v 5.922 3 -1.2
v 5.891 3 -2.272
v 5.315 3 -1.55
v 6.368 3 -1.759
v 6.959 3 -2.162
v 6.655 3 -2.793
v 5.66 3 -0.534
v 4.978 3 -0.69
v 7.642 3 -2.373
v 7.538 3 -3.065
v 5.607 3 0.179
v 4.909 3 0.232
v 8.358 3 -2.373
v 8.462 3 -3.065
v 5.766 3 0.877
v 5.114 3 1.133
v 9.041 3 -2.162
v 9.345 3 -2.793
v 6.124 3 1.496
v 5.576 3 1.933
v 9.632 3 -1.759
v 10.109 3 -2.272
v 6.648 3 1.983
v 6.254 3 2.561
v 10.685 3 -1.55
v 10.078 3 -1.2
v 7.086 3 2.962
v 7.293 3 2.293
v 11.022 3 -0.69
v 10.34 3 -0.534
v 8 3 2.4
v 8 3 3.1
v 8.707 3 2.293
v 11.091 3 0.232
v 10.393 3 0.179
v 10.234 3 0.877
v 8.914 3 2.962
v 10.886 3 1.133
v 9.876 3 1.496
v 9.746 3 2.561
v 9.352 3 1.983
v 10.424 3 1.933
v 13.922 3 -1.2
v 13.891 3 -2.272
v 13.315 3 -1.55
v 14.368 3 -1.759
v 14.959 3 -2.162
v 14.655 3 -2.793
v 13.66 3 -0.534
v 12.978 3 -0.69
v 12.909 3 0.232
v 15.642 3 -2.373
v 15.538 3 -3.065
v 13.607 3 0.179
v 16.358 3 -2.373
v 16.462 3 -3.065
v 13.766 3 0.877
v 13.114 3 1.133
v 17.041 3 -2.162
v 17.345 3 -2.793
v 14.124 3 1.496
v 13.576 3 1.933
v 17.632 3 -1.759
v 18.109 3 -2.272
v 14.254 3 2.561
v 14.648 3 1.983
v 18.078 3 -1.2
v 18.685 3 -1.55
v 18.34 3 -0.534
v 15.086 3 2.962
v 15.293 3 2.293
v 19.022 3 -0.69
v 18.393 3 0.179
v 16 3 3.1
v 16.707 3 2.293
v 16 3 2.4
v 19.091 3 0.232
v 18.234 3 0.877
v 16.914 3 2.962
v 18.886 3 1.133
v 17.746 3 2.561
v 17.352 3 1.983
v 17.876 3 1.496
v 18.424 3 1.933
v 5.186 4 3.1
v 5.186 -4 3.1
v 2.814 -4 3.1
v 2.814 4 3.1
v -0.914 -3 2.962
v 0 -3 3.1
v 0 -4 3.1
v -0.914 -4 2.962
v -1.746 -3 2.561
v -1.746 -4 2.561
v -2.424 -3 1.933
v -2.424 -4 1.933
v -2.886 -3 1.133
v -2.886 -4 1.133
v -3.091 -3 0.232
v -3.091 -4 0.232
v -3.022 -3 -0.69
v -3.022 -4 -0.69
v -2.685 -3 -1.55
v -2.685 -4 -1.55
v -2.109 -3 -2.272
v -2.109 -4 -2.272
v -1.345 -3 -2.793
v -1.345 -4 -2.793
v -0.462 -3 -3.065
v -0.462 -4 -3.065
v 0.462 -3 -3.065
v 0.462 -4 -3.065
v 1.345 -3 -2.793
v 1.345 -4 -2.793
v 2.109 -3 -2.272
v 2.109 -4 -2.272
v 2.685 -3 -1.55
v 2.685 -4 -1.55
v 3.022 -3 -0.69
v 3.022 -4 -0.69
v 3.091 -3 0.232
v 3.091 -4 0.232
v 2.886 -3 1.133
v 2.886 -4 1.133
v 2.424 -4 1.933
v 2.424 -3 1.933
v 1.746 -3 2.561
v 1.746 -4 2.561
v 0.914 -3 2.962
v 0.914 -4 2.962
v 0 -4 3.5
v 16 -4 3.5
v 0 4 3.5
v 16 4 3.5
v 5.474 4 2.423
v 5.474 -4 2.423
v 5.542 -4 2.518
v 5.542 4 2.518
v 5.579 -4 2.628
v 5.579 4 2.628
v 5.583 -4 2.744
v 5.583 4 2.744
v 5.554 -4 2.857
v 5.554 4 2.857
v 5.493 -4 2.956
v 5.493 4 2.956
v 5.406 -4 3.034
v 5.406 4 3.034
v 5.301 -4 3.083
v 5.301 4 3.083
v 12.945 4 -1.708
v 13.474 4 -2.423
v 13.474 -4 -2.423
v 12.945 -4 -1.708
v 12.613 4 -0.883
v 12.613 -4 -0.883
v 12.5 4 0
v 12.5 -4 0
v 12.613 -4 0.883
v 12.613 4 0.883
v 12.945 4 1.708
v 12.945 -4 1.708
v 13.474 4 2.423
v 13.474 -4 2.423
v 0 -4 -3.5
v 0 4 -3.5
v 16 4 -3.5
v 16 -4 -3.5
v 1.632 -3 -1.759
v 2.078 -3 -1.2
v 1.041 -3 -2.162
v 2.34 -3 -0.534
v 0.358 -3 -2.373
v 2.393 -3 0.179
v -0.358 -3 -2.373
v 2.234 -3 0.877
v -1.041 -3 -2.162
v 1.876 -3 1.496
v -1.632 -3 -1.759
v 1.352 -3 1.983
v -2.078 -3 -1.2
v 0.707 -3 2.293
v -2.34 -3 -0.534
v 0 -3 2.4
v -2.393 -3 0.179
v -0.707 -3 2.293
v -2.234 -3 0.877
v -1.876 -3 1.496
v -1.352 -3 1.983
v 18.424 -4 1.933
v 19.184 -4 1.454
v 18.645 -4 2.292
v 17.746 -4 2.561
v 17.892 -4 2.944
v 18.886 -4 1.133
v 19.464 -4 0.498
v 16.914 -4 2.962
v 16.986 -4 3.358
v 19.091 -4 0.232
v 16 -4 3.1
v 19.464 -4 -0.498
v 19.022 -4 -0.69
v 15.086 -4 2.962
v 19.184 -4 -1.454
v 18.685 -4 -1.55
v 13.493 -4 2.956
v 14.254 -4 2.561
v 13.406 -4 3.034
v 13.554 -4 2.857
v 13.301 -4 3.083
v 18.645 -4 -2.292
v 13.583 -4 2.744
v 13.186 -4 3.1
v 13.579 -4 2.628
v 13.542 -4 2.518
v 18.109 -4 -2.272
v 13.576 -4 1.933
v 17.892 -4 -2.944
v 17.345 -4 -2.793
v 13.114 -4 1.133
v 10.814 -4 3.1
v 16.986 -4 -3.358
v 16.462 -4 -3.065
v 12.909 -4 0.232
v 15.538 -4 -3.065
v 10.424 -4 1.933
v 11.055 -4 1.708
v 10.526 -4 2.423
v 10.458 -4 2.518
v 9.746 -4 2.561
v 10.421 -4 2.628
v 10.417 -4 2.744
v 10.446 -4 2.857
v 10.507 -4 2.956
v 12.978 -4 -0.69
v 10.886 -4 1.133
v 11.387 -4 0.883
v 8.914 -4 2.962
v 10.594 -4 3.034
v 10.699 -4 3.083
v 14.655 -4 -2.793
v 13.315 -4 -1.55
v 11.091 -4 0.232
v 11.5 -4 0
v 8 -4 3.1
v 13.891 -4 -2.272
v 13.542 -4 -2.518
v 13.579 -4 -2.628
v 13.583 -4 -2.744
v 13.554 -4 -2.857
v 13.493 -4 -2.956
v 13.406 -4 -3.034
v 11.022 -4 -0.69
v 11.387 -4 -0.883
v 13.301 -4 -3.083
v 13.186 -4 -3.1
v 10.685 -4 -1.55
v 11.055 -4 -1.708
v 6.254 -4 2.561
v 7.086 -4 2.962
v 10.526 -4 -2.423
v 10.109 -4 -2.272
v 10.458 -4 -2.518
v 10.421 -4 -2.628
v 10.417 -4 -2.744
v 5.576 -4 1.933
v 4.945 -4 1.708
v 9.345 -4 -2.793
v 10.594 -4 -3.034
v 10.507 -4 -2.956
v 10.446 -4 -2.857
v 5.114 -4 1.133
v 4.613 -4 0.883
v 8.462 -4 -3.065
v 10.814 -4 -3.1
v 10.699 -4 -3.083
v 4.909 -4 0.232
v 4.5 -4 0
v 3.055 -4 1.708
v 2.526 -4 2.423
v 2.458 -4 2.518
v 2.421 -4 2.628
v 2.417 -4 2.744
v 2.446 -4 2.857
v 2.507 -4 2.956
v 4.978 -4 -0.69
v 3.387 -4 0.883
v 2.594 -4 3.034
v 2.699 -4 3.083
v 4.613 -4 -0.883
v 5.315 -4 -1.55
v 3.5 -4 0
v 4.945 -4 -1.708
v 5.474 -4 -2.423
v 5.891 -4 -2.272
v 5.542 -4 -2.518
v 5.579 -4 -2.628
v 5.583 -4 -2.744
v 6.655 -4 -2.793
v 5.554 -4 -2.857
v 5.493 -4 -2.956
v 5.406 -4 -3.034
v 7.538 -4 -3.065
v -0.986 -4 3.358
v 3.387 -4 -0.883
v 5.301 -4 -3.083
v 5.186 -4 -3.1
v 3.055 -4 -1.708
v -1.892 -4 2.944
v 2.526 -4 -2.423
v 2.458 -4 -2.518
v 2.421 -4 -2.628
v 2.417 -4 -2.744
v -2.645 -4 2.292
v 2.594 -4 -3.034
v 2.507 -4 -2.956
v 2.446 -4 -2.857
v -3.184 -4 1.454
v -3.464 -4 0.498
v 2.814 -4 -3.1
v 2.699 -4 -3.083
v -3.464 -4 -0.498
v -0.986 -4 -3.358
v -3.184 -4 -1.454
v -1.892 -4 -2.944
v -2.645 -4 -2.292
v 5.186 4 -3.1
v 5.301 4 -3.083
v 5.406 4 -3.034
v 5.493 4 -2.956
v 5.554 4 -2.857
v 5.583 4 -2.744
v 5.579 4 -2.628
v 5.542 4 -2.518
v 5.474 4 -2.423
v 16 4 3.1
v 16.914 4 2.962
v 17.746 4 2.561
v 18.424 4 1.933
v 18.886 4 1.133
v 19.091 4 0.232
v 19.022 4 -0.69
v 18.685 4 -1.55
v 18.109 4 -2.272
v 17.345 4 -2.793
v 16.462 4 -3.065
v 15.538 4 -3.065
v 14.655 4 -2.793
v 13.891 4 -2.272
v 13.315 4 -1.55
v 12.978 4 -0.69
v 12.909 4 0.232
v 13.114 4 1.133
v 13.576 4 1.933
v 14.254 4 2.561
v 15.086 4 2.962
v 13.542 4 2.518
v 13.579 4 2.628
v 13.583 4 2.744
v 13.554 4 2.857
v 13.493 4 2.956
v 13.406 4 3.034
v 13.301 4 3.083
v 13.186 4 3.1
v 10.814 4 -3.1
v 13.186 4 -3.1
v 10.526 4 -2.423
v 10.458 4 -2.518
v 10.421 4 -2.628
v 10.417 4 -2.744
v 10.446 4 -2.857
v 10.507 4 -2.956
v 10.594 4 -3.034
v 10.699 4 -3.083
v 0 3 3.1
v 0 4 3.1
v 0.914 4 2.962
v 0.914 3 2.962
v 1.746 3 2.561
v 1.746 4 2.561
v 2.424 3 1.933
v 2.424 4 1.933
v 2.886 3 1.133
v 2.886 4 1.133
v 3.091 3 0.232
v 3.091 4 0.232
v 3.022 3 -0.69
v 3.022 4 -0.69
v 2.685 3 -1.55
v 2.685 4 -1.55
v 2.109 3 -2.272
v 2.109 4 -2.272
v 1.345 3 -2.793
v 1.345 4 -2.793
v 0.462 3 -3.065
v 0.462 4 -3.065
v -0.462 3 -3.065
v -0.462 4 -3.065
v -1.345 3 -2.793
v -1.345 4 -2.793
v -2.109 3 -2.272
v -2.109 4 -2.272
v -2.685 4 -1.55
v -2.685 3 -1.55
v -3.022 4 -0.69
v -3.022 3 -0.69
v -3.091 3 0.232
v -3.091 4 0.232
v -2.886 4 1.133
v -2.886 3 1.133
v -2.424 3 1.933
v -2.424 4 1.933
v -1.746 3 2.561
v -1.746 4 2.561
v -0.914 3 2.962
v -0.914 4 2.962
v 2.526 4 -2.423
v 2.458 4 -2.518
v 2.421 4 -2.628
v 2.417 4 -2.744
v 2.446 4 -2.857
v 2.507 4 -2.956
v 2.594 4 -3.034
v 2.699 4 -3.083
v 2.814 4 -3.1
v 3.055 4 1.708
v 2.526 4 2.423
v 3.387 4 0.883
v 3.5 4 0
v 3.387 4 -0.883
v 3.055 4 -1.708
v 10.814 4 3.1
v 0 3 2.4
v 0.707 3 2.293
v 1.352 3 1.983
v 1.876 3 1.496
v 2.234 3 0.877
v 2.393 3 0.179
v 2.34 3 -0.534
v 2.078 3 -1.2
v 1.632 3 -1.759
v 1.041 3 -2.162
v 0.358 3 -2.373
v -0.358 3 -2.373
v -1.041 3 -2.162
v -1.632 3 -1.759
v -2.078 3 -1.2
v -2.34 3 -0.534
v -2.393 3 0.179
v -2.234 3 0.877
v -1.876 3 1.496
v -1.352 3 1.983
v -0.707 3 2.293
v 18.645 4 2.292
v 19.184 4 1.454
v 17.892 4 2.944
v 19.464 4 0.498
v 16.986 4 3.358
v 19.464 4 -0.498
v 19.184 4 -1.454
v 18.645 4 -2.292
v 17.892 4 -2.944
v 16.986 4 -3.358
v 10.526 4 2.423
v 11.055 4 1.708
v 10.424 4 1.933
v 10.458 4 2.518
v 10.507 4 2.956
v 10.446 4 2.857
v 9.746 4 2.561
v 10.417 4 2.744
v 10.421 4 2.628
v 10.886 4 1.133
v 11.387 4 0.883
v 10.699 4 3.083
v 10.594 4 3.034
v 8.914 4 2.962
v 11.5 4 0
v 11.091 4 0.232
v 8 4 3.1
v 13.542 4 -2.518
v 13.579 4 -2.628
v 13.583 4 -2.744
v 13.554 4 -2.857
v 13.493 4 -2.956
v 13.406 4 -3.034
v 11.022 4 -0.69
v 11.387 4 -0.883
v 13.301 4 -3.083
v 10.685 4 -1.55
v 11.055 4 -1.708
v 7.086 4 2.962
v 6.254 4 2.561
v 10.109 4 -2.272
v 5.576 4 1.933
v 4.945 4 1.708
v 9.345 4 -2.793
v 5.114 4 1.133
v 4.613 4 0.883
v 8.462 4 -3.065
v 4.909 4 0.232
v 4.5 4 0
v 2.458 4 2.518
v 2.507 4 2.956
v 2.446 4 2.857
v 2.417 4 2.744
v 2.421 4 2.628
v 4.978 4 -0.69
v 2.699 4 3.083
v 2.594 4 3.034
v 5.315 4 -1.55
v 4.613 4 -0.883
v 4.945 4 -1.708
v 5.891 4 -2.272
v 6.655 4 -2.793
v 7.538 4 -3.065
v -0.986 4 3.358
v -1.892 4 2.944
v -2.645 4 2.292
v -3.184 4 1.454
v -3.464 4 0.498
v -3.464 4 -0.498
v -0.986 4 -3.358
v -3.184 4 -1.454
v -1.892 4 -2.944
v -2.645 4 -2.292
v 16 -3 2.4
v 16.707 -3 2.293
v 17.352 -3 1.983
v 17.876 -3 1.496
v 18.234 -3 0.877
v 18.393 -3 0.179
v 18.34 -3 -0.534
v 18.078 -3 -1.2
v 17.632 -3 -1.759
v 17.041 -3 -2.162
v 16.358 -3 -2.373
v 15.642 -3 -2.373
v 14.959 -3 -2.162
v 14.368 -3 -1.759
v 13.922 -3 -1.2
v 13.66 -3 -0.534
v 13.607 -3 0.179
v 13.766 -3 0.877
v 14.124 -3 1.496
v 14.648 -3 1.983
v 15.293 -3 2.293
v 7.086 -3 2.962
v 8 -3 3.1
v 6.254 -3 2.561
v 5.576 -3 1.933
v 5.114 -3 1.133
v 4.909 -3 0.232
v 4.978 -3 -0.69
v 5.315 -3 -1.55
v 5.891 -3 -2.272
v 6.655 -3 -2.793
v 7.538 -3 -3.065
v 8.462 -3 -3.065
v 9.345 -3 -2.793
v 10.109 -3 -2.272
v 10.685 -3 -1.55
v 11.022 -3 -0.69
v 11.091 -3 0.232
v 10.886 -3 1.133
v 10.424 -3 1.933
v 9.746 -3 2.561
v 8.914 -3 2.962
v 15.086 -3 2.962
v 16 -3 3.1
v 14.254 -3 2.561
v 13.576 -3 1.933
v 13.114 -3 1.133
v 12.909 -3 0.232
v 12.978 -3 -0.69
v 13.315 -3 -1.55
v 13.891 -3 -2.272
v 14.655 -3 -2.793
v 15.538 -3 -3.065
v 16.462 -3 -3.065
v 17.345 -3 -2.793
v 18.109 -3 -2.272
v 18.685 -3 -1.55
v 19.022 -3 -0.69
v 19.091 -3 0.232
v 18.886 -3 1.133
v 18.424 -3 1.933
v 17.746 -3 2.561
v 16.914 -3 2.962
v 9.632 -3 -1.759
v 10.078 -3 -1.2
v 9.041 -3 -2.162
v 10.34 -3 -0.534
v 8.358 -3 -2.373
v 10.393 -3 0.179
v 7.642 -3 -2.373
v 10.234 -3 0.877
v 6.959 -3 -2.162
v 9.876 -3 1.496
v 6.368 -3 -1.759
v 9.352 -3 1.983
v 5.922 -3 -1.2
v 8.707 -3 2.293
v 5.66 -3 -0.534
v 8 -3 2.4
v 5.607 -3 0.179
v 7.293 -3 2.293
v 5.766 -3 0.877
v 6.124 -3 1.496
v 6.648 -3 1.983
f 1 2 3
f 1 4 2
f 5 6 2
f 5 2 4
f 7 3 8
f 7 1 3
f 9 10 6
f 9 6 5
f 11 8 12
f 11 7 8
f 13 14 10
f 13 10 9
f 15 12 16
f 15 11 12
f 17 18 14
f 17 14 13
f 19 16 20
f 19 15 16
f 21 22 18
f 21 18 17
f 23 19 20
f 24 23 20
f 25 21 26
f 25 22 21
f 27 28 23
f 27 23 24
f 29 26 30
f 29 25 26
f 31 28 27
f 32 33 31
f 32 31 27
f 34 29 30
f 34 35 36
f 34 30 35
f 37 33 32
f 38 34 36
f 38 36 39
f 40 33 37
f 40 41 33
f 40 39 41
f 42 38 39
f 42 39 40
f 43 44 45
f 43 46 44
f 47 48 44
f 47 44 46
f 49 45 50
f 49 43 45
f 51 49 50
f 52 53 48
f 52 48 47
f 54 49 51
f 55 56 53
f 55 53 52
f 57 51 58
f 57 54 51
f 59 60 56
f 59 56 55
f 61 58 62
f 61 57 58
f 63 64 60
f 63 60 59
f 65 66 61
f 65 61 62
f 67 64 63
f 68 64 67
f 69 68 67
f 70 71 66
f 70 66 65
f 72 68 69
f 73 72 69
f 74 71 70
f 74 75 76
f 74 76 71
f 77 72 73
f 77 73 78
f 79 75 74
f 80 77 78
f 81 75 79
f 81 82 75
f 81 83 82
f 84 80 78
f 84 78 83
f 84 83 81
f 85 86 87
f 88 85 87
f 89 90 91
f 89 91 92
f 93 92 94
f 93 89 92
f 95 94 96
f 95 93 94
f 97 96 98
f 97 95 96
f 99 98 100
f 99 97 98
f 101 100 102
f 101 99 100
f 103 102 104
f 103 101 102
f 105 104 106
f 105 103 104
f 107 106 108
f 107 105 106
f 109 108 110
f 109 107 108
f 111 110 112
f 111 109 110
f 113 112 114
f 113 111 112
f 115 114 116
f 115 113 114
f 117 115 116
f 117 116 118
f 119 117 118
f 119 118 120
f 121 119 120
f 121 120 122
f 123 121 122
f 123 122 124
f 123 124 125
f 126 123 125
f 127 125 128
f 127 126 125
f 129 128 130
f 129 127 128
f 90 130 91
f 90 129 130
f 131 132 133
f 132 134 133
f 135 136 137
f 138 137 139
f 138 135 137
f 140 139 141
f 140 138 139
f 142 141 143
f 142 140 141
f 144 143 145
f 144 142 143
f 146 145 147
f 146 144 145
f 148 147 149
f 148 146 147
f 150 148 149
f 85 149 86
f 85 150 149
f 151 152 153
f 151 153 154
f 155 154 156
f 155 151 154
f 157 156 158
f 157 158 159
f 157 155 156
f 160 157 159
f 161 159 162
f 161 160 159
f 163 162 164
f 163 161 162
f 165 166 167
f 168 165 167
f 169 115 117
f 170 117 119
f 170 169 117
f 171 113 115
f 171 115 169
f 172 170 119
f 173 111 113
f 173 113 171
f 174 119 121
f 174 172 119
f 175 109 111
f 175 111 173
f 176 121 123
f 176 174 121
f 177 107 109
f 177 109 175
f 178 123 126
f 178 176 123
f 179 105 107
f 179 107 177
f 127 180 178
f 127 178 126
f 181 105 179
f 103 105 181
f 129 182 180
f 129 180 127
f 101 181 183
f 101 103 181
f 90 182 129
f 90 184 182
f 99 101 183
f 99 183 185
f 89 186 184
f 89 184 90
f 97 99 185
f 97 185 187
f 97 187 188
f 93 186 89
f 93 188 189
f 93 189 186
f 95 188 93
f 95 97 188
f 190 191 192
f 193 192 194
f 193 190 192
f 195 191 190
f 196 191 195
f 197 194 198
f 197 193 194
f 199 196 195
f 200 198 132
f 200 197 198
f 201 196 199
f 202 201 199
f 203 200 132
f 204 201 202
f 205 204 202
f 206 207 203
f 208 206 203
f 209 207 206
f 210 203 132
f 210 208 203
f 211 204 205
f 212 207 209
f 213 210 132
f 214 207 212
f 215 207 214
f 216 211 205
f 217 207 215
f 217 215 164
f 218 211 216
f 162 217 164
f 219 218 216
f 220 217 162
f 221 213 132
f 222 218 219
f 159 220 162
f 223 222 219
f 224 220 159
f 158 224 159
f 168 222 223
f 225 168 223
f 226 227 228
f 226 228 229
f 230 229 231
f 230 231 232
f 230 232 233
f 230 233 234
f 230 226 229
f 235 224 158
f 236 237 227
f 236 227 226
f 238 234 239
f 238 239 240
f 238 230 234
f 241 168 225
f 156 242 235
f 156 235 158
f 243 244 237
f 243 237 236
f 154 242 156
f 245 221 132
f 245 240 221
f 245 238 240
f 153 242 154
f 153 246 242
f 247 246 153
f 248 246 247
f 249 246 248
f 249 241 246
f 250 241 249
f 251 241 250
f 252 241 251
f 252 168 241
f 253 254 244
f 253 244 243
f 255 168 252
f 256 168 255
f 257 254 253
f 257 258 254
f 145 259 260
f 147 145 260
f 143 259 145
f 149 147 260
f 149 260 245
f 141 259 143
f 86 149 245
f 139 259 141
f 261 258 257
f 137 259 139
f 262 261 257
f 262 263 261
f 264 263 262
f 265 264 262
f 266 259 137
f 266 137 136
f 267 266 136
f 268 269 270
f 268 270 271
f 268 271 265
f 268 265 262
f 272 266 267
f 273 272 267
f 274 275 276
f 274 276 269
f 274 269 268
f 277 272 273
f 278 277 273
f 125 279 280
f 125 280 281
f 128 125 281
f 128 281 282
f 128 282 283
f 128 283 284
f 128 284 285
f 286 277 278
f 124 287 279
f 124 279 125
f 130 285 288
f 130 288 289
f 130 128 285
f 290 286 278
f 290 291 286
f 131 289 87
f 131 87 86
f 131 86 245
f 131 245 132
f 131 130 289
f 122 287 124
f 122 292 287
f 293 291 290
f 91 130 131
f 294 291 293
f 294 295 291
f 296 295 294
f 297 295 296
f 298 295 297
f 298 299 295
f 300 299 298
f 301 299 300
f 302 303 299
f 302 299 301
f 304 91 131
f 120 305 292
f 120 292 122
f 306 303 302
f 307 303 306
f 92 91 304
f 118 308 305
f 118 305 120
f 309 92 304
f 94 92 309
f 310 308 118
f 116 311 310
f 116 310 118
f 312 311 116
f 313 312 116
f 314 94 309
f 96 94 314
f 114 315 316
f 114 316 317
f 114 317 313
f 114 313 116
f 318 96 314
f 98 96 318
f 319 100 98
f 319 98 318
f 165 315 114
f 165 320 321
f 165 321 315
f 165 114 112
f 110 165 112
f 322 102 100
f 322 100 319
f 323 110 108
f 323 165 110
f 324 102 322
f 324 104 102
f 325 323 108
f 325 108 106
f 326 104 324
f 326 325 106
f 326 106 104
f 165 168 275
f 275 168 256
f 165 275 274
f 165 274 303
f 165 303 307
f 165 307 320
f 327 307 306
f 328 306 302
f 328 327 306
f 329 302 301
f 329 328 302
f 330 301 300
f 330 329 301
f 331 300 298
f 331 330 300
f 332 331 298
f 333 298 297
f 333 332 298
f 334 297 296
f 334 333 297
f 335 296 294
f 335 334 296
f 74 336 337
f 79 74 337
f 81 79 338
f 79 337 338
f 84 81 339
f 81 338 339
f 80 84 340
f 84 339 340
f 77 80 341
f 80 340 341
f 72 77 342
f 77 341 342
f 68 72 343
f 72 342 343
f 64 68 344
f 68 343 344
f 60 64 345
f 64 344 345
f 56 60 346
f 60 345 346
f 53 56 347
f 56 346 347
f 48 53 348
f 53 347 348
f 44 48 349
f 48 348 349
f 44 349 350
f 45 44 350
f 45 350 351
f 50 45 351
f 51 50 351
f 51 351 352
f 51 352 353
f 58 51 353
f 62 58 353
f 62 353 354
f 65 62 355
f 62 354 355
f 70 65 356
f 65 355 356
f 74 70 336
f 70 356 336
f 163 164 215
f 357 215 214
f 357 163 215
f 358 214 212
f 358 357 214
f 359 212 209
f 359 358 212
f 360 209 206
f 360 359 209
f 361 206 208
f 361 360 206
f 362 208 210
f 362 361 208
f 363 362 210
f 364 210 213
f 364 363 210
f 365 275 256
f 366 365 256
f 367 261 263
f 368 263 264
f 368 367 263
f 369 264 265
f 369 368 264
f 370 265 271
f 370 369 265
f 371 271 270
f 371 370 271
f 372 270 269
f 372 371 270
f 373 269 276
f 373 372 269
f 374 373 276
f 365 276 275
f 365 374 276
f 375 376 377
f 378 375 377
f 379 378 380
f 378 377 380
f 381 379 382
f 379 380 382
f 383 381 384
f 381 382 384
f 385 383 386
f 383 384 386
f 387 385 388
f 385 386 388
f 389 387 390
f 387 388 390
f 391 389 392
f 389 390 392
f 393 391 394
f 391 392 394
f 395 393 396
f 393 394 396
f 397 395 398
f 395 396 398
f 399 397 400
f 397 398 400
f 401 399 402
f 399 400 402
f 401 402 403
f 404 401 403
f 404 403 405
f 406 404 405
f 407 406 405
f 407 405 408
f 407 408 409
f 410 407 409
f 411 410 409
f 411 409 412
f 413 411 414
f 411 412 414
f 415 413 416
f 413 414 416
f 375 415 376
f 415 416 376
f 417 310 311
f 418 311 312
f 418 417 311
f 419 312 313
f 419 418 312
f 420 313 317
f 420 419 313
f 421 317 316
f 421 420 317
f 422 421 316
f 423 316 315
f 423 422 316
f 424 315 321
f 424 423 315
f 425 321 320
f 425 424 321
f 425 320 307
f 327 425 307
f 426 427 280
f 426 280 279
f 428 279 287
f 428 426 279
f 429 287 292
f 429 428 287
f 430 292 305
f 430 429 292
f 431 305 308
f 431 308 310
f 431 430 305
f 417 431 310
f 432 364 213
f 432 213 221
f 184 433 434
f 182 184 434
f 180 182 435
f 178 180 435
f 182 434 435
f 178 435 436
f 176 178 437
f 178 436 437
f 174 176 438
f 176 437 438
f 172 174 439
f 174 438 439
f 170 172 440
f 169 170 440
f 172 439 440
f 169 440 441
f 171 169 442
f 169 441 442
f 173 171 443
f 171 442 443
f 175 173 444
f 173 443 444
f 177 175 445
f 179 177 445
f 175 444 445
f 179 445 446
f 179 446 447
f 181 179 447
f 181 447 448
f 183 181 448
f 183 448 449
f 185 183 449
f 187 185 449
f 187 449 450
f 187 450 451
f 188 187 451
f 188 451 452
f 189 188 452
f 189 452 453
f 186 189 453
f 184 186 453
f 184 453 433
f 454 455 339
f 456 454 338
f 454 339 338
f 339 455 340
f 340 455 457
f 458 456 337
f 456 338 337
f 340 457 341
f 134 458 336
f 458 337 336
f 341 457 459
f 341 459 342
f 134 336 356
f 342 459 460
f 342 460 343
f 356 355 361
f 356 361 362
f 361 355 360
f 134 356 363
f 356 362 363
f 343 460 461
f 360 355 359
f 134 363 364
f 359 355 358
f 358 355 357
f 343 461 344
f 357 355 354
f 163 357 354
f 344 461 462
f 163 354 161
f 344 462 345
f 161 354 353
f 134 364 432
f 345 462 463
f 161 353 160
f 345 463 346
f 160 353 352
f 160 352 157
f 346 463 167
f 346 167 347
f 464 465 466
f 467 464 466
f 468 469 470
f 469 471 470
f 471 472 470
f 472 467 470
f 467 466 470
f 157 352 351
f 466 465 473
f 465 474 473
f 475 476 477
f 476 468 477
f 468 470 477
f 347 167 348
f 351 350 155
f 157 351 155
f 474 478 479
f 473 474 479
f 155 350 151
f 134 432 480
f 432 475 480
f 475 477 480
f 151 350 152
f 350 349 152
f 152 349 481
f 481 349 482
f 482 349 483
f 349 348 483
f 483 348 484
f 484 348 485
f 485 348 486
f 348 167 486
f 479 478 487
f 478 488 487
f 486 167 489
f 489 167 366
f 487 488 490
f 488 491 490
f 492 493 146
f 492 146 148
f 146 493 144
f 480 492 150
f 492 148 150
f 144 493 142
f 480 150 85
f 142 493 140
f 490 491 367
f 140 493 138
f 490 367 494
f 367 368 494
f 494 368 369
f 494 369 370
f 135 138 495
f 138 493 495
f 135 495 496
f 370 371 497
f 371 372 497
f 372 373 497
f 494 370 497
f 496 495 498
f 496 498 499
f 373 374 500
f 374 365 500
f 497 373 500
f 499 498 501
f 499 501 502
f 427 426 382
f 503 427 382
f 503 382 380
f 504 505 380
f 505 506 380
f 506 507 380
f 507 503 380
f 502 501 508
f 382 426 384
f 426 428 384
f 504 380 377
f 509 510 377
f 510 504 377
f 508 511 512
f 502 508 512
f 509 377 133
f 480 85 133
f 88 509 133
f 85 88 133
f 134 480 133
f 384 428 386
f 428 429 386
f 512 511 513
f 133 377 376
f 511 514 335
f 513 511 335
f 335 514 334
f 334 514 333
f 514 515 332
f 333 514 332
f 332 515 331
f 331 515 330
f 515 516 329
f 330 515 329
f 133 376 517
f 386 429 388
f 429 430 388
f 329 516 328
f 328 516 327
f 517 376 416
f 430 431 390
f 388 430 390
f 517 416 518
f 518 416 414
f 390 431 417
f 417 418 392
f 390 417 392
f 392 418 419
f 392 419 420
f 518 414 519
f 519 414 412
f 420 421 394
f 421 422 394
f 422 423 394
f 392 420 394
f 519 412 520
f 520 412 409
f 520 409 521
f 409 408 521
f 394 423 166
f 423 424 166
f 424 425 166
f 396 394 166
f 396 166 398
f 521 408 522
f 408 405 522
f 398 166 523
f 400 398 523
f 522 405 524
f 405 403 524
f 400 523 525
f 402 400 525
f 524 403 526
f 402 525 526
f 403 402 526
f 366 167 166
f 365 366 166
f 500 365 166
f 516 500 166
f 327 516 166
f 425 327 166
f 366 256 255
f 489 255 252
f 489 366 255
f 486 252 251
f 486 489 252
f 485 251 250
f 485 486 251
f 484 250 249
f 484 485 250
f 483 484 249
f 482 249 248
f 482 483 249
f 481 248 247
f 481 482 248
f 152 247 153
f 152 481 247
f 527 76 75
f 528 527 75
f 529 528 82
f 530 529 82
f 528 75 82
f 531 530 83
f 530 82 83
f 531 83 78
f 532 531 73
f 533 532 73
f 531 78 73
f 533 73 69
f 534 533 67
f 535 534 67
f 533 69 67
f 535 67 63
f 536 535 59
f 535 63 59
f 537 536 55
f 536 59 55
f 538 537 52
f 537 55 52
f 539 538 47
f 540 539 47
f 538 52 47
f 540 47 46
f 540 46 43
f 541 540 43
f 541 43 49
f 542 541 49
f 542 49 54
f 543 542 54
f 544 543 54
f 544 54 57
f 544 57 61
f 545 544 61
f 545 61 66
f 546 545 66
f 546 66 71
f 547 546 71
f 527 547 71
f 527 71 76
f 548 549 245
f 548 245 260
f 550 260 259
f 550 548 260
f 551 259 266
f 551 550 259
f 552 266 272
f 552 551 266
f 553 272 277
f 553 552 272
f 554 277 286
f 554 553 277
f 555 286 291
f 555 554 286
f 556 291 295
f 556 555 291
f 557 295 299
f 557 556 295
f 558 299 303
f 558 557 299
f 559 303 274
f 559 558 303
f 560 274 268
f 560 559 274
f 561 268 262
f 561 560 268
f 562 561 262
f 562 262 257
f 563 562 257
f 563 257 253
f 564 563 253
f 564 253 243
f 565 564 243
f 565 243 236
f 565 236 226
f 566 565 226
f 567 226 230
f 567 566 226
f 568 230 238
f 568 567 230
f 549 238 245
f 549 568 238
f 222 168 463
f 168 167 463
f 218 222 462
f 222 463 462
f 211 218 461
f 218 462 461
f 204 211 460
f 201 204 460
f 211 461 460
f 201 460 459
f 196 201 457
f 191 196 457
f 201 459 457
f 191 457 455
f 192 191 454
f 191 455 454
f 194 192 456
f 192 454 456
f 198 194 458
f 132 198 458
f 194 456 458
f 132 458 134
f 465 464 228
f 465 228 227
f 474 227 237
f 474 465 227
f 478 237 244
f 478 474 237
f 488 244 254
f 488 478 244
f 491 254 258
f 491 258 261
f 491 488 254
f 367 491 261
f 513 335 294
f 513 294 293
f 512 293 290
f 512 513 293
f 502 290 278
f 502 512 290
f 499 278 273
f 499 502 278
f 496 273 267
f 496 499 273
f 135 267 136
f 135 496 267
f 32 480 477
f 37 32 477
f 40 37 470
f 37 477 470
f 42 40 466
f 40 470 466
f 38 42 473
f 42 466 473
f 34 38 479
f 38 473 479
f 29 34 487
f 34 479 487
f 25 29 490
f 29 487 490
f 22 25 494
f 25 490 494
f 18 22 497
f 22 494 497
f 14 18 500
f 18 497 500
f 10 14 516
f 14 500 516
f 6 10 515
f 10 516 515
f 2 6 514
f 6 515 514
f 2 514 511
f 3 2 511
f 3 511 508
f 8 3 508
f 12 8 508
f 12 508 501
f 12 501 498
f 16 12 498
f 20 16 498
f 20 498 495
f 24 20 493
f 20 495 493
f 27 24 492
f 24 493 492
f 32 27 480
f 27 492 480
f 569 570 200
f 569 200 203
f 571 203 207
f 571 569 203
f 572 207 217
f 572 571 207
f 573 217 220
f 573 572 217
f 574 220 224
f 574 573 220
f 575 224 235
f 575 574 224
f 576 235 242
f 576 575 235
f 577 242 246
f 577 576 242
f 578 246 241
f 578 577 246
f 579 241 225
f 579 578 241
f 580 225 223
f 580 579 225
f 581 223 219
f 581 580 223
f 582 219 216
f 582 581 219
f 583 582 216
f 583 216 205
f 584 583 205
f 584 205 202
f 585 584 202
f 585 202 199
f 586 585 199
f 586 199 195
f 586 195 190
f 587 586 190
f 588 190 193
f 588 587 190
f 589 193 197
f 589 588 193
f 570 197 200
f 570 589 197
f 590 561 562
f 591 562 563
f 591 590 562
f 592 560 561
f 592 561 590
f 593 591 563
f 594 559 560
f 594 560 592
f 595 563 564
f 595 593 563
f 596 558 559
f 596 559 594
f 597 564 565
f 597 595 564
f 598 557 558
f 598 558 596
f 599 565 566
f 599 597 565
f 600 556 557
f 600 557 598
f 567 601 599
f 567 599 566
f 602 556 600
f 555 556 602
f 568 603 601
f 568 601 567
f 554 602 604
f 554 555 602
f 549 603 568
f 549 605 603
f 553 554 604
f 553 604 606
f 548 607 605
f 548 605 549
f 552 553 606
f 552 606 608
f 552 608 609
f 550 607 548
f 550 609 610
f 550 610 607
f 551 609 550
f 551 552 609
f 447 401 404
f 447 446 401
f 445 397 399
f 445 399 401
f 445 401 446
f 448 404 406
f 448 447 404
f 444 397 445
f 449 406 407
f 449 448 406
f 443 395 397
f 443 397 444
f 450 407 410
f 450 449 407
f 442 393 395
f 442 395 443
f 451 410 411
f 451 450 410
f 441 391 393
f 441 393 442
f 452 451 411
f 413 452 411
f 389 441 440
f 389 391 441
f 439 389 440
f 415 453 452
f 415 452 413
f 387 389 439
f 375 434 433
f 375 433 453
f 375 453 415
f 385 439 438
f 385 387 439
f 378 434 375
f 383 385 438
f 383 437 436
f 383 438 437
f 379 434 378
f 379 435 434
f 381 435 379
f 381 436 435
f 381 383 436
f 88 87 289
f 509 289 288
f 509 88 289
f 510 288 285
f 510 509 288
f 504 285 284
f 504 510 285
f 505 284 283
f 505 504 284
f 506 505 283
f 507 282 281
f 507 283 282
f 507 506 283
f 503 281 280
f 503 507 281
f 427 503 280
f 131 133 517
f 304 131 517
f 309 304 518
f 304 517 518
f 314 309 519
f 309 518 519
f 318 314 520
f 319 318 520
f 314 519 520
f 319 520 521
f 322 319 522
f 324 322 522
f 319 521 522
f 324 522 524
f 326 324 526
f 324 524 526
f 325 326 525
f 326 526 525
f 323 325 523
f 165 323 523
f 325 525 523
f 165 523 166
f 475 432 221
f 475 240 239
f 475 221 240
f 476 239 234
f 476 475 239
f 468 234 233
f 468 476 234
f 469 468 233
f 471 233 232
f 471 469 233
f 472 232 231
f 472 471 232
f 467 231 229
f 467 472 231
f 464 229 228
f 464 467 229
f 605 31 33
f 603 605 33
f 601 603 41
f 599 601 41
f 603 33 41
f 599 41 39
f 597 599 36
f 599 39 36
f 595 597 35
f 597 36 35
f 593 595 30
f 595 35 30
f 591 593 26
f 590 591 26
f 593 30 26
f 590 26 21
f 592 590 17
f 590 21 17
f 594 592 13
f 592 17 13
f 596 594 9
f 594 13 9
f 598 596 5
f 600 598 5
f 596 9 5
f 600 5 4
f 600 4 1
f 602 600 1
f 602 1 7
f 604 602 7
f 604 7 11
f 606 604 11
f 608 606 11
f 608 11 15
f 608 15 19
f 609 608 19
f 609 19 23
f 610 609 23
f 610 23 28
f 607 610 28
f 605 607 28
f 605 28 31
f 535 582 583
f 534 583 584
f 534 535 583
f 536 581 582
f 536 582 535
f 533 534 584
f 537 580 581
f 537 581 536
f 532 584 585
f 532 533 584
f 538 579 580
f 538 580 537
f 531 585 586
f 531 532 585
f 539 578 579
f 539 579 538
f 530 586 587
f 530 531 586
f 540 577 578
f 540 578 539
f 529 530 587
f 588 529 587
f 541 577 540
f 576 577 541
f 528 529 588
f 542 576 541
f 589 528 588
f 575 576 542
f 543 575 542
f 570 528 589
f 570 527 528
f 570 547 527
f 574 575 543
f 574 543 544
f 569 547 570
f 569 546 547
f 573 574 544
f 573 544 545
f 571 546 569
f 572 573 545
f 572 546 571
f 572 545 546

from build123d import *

# Parameters (mm, degrees)
BOSS_EXTRUDE1_DEPTH = 4
SKETCH3_R           = 3.1
CUT_EXTRUDE1_DEPTH  = 1
SKETCH4_R           = 2.4
CUT_EXTRUDE2_DEPTH  = 22.365860619
CUT_EXTRUDE4_START  = -1
SKETCH7_R           = 3.1
CUT_EXTRUDE4_DEPTH  = 1
LPATTERN3_COUNT     = 3
LPATTERN3_PITCH     = 8
CUT_EXTRUDE5_DEPTH  = 22.365860619
LPATTERN4_COUNT     = 2
LPATTERN4_PITCH     = 8


with BuildPart() as part:
    # Sketch2 → Boss-Extrude1 (new, symmetric)
    with BuildSketch(Plane(origin=(0, 0, 0), x_dir=(1, 0, 0), z_dir=(0, 1, 0))):
        with BuildLine():
            Line((0, 3.5), (16, 3.5))
            ThreePointArc((16, 3.5), (19.5, 0), (16, -3.5))
            Line((16, -3.5), (0, -3.5))
            ThreePointArc((0, -3.5), (-3.5, 0), (0, 3.5))
        make_face()
    extrude(amount=BOSS_EXTRUDE1_DEPTH, both=True)

    # Sketch3 → Cut-Extrude1 (cut)
    with BuildSketch(Plane(origin=(0, 4, 0), x_dir=(1, 0, 0), z_dir=(0, 1, 0))):
        with Locations(Location((0, 0, 0), (0, 0, 270))):
            Circle(SKETCH3_R)
    cut_extrude1 = extrude(amount=-CUT_EXTRUDE1_DEPTH, mode=Mode.SUBTRACT)

    # Sketch4 → Cut-Extrude2 (cut, through all)
    with BuildSketch(Plane(origin=(0, 4, 0), x_dir=(1, 0, 0), z_dir=(0, 1, 0))):
        with Locations(Location((0, 0, 0), (0, 0, 270))):
            Circle(SKETCH4_R)
    cut_extrude2 = extrude(amount=-CUT_EXTRUDE2_DEPTH, mode=Mode.SUBTRACT)

    # Sketch7 → Cut-Extrude4 (cut)
    with BuildSketch(Plane(origin=(0, -4, 0), x_dir=(-1, 0, 0), z_dir=(0, -1, 0)).offset(CUT_EXTRUDE4_START)):
        with Locations(Location((0, 0, 0), (0, 0, 270))):
            Circle(SKETCH7_R)
    cut_extrude4 = extrude(amount=CUT_EXTRUDE4_DEPTH, mode=Mode.SUBTRACT)

    # LPattern3: Cut-Extrude1, Cut-Extrude2, Cut-Extrude4 ×3
    with Locations(*[(i * LPATTERN3_PITCH, 0, 0) for i in range(1, LPATTERN3_COUNT)]):
        add(cut_extrude1, mode=Mode.SUBTRACT)
        add(cut_extrude2, mode=Mode.SUBTRACT)
        add(cut_extrude4, mode=Mode.SUBTRACT)

    # Sketch8 → Cut-Extrude5 (cut, through all)
    with BuildSketch(Plane(origin=(0, 4, 0), x_dir=(1, 0, 0), z_dir=(0, 1, 0))):
        with BuildLine():
            Line((2.814249456, 3.1), (5.185750544, 3.1))
            ThreePointArc((5.185750544, 3.1), (5.553697029, 2.856892908), (5.474391514, 2.423076923))
            ThreePointArc((5.474391514, 2.423076923), (4.5, 0), (5.474391514, -2.423076923))
            ThreePointArc((5.474391514, -2.423076923), (5.553697029, -2.856892908), (5.185750544, -3.1))
            Line((5.185750544, -3.1), (2.814249456, -3.1))
            ThreePointArc((2.814249456, -3.1), (2.446302971, -2.856892908), (2.525608486, -2.423076923))
            ThreePointArc((2.525608486, -2.423076923), (3.5, 0), (2.525608486, 2.423076923))
            ThreePointArc((2.525608486, 2.423076923), (2.446302971, 2.856892908), (2.814249456, 3.1))
        make_face()
    cut_extrude5 = extrude(amount=-CUT_EXTRUDE5_DEPTH, mode=Mode.SUBTRACT)

    # LPattern4: Cut-Extrude5 ×2
    with Locations(*[(i * LPATTERN4_PITCH, 0, 0) for i in range(1, LPATTERN4_COUNT)]):
        add(cut_extrude5, mode=Mode.SUBTRACT)


solid = part.part
